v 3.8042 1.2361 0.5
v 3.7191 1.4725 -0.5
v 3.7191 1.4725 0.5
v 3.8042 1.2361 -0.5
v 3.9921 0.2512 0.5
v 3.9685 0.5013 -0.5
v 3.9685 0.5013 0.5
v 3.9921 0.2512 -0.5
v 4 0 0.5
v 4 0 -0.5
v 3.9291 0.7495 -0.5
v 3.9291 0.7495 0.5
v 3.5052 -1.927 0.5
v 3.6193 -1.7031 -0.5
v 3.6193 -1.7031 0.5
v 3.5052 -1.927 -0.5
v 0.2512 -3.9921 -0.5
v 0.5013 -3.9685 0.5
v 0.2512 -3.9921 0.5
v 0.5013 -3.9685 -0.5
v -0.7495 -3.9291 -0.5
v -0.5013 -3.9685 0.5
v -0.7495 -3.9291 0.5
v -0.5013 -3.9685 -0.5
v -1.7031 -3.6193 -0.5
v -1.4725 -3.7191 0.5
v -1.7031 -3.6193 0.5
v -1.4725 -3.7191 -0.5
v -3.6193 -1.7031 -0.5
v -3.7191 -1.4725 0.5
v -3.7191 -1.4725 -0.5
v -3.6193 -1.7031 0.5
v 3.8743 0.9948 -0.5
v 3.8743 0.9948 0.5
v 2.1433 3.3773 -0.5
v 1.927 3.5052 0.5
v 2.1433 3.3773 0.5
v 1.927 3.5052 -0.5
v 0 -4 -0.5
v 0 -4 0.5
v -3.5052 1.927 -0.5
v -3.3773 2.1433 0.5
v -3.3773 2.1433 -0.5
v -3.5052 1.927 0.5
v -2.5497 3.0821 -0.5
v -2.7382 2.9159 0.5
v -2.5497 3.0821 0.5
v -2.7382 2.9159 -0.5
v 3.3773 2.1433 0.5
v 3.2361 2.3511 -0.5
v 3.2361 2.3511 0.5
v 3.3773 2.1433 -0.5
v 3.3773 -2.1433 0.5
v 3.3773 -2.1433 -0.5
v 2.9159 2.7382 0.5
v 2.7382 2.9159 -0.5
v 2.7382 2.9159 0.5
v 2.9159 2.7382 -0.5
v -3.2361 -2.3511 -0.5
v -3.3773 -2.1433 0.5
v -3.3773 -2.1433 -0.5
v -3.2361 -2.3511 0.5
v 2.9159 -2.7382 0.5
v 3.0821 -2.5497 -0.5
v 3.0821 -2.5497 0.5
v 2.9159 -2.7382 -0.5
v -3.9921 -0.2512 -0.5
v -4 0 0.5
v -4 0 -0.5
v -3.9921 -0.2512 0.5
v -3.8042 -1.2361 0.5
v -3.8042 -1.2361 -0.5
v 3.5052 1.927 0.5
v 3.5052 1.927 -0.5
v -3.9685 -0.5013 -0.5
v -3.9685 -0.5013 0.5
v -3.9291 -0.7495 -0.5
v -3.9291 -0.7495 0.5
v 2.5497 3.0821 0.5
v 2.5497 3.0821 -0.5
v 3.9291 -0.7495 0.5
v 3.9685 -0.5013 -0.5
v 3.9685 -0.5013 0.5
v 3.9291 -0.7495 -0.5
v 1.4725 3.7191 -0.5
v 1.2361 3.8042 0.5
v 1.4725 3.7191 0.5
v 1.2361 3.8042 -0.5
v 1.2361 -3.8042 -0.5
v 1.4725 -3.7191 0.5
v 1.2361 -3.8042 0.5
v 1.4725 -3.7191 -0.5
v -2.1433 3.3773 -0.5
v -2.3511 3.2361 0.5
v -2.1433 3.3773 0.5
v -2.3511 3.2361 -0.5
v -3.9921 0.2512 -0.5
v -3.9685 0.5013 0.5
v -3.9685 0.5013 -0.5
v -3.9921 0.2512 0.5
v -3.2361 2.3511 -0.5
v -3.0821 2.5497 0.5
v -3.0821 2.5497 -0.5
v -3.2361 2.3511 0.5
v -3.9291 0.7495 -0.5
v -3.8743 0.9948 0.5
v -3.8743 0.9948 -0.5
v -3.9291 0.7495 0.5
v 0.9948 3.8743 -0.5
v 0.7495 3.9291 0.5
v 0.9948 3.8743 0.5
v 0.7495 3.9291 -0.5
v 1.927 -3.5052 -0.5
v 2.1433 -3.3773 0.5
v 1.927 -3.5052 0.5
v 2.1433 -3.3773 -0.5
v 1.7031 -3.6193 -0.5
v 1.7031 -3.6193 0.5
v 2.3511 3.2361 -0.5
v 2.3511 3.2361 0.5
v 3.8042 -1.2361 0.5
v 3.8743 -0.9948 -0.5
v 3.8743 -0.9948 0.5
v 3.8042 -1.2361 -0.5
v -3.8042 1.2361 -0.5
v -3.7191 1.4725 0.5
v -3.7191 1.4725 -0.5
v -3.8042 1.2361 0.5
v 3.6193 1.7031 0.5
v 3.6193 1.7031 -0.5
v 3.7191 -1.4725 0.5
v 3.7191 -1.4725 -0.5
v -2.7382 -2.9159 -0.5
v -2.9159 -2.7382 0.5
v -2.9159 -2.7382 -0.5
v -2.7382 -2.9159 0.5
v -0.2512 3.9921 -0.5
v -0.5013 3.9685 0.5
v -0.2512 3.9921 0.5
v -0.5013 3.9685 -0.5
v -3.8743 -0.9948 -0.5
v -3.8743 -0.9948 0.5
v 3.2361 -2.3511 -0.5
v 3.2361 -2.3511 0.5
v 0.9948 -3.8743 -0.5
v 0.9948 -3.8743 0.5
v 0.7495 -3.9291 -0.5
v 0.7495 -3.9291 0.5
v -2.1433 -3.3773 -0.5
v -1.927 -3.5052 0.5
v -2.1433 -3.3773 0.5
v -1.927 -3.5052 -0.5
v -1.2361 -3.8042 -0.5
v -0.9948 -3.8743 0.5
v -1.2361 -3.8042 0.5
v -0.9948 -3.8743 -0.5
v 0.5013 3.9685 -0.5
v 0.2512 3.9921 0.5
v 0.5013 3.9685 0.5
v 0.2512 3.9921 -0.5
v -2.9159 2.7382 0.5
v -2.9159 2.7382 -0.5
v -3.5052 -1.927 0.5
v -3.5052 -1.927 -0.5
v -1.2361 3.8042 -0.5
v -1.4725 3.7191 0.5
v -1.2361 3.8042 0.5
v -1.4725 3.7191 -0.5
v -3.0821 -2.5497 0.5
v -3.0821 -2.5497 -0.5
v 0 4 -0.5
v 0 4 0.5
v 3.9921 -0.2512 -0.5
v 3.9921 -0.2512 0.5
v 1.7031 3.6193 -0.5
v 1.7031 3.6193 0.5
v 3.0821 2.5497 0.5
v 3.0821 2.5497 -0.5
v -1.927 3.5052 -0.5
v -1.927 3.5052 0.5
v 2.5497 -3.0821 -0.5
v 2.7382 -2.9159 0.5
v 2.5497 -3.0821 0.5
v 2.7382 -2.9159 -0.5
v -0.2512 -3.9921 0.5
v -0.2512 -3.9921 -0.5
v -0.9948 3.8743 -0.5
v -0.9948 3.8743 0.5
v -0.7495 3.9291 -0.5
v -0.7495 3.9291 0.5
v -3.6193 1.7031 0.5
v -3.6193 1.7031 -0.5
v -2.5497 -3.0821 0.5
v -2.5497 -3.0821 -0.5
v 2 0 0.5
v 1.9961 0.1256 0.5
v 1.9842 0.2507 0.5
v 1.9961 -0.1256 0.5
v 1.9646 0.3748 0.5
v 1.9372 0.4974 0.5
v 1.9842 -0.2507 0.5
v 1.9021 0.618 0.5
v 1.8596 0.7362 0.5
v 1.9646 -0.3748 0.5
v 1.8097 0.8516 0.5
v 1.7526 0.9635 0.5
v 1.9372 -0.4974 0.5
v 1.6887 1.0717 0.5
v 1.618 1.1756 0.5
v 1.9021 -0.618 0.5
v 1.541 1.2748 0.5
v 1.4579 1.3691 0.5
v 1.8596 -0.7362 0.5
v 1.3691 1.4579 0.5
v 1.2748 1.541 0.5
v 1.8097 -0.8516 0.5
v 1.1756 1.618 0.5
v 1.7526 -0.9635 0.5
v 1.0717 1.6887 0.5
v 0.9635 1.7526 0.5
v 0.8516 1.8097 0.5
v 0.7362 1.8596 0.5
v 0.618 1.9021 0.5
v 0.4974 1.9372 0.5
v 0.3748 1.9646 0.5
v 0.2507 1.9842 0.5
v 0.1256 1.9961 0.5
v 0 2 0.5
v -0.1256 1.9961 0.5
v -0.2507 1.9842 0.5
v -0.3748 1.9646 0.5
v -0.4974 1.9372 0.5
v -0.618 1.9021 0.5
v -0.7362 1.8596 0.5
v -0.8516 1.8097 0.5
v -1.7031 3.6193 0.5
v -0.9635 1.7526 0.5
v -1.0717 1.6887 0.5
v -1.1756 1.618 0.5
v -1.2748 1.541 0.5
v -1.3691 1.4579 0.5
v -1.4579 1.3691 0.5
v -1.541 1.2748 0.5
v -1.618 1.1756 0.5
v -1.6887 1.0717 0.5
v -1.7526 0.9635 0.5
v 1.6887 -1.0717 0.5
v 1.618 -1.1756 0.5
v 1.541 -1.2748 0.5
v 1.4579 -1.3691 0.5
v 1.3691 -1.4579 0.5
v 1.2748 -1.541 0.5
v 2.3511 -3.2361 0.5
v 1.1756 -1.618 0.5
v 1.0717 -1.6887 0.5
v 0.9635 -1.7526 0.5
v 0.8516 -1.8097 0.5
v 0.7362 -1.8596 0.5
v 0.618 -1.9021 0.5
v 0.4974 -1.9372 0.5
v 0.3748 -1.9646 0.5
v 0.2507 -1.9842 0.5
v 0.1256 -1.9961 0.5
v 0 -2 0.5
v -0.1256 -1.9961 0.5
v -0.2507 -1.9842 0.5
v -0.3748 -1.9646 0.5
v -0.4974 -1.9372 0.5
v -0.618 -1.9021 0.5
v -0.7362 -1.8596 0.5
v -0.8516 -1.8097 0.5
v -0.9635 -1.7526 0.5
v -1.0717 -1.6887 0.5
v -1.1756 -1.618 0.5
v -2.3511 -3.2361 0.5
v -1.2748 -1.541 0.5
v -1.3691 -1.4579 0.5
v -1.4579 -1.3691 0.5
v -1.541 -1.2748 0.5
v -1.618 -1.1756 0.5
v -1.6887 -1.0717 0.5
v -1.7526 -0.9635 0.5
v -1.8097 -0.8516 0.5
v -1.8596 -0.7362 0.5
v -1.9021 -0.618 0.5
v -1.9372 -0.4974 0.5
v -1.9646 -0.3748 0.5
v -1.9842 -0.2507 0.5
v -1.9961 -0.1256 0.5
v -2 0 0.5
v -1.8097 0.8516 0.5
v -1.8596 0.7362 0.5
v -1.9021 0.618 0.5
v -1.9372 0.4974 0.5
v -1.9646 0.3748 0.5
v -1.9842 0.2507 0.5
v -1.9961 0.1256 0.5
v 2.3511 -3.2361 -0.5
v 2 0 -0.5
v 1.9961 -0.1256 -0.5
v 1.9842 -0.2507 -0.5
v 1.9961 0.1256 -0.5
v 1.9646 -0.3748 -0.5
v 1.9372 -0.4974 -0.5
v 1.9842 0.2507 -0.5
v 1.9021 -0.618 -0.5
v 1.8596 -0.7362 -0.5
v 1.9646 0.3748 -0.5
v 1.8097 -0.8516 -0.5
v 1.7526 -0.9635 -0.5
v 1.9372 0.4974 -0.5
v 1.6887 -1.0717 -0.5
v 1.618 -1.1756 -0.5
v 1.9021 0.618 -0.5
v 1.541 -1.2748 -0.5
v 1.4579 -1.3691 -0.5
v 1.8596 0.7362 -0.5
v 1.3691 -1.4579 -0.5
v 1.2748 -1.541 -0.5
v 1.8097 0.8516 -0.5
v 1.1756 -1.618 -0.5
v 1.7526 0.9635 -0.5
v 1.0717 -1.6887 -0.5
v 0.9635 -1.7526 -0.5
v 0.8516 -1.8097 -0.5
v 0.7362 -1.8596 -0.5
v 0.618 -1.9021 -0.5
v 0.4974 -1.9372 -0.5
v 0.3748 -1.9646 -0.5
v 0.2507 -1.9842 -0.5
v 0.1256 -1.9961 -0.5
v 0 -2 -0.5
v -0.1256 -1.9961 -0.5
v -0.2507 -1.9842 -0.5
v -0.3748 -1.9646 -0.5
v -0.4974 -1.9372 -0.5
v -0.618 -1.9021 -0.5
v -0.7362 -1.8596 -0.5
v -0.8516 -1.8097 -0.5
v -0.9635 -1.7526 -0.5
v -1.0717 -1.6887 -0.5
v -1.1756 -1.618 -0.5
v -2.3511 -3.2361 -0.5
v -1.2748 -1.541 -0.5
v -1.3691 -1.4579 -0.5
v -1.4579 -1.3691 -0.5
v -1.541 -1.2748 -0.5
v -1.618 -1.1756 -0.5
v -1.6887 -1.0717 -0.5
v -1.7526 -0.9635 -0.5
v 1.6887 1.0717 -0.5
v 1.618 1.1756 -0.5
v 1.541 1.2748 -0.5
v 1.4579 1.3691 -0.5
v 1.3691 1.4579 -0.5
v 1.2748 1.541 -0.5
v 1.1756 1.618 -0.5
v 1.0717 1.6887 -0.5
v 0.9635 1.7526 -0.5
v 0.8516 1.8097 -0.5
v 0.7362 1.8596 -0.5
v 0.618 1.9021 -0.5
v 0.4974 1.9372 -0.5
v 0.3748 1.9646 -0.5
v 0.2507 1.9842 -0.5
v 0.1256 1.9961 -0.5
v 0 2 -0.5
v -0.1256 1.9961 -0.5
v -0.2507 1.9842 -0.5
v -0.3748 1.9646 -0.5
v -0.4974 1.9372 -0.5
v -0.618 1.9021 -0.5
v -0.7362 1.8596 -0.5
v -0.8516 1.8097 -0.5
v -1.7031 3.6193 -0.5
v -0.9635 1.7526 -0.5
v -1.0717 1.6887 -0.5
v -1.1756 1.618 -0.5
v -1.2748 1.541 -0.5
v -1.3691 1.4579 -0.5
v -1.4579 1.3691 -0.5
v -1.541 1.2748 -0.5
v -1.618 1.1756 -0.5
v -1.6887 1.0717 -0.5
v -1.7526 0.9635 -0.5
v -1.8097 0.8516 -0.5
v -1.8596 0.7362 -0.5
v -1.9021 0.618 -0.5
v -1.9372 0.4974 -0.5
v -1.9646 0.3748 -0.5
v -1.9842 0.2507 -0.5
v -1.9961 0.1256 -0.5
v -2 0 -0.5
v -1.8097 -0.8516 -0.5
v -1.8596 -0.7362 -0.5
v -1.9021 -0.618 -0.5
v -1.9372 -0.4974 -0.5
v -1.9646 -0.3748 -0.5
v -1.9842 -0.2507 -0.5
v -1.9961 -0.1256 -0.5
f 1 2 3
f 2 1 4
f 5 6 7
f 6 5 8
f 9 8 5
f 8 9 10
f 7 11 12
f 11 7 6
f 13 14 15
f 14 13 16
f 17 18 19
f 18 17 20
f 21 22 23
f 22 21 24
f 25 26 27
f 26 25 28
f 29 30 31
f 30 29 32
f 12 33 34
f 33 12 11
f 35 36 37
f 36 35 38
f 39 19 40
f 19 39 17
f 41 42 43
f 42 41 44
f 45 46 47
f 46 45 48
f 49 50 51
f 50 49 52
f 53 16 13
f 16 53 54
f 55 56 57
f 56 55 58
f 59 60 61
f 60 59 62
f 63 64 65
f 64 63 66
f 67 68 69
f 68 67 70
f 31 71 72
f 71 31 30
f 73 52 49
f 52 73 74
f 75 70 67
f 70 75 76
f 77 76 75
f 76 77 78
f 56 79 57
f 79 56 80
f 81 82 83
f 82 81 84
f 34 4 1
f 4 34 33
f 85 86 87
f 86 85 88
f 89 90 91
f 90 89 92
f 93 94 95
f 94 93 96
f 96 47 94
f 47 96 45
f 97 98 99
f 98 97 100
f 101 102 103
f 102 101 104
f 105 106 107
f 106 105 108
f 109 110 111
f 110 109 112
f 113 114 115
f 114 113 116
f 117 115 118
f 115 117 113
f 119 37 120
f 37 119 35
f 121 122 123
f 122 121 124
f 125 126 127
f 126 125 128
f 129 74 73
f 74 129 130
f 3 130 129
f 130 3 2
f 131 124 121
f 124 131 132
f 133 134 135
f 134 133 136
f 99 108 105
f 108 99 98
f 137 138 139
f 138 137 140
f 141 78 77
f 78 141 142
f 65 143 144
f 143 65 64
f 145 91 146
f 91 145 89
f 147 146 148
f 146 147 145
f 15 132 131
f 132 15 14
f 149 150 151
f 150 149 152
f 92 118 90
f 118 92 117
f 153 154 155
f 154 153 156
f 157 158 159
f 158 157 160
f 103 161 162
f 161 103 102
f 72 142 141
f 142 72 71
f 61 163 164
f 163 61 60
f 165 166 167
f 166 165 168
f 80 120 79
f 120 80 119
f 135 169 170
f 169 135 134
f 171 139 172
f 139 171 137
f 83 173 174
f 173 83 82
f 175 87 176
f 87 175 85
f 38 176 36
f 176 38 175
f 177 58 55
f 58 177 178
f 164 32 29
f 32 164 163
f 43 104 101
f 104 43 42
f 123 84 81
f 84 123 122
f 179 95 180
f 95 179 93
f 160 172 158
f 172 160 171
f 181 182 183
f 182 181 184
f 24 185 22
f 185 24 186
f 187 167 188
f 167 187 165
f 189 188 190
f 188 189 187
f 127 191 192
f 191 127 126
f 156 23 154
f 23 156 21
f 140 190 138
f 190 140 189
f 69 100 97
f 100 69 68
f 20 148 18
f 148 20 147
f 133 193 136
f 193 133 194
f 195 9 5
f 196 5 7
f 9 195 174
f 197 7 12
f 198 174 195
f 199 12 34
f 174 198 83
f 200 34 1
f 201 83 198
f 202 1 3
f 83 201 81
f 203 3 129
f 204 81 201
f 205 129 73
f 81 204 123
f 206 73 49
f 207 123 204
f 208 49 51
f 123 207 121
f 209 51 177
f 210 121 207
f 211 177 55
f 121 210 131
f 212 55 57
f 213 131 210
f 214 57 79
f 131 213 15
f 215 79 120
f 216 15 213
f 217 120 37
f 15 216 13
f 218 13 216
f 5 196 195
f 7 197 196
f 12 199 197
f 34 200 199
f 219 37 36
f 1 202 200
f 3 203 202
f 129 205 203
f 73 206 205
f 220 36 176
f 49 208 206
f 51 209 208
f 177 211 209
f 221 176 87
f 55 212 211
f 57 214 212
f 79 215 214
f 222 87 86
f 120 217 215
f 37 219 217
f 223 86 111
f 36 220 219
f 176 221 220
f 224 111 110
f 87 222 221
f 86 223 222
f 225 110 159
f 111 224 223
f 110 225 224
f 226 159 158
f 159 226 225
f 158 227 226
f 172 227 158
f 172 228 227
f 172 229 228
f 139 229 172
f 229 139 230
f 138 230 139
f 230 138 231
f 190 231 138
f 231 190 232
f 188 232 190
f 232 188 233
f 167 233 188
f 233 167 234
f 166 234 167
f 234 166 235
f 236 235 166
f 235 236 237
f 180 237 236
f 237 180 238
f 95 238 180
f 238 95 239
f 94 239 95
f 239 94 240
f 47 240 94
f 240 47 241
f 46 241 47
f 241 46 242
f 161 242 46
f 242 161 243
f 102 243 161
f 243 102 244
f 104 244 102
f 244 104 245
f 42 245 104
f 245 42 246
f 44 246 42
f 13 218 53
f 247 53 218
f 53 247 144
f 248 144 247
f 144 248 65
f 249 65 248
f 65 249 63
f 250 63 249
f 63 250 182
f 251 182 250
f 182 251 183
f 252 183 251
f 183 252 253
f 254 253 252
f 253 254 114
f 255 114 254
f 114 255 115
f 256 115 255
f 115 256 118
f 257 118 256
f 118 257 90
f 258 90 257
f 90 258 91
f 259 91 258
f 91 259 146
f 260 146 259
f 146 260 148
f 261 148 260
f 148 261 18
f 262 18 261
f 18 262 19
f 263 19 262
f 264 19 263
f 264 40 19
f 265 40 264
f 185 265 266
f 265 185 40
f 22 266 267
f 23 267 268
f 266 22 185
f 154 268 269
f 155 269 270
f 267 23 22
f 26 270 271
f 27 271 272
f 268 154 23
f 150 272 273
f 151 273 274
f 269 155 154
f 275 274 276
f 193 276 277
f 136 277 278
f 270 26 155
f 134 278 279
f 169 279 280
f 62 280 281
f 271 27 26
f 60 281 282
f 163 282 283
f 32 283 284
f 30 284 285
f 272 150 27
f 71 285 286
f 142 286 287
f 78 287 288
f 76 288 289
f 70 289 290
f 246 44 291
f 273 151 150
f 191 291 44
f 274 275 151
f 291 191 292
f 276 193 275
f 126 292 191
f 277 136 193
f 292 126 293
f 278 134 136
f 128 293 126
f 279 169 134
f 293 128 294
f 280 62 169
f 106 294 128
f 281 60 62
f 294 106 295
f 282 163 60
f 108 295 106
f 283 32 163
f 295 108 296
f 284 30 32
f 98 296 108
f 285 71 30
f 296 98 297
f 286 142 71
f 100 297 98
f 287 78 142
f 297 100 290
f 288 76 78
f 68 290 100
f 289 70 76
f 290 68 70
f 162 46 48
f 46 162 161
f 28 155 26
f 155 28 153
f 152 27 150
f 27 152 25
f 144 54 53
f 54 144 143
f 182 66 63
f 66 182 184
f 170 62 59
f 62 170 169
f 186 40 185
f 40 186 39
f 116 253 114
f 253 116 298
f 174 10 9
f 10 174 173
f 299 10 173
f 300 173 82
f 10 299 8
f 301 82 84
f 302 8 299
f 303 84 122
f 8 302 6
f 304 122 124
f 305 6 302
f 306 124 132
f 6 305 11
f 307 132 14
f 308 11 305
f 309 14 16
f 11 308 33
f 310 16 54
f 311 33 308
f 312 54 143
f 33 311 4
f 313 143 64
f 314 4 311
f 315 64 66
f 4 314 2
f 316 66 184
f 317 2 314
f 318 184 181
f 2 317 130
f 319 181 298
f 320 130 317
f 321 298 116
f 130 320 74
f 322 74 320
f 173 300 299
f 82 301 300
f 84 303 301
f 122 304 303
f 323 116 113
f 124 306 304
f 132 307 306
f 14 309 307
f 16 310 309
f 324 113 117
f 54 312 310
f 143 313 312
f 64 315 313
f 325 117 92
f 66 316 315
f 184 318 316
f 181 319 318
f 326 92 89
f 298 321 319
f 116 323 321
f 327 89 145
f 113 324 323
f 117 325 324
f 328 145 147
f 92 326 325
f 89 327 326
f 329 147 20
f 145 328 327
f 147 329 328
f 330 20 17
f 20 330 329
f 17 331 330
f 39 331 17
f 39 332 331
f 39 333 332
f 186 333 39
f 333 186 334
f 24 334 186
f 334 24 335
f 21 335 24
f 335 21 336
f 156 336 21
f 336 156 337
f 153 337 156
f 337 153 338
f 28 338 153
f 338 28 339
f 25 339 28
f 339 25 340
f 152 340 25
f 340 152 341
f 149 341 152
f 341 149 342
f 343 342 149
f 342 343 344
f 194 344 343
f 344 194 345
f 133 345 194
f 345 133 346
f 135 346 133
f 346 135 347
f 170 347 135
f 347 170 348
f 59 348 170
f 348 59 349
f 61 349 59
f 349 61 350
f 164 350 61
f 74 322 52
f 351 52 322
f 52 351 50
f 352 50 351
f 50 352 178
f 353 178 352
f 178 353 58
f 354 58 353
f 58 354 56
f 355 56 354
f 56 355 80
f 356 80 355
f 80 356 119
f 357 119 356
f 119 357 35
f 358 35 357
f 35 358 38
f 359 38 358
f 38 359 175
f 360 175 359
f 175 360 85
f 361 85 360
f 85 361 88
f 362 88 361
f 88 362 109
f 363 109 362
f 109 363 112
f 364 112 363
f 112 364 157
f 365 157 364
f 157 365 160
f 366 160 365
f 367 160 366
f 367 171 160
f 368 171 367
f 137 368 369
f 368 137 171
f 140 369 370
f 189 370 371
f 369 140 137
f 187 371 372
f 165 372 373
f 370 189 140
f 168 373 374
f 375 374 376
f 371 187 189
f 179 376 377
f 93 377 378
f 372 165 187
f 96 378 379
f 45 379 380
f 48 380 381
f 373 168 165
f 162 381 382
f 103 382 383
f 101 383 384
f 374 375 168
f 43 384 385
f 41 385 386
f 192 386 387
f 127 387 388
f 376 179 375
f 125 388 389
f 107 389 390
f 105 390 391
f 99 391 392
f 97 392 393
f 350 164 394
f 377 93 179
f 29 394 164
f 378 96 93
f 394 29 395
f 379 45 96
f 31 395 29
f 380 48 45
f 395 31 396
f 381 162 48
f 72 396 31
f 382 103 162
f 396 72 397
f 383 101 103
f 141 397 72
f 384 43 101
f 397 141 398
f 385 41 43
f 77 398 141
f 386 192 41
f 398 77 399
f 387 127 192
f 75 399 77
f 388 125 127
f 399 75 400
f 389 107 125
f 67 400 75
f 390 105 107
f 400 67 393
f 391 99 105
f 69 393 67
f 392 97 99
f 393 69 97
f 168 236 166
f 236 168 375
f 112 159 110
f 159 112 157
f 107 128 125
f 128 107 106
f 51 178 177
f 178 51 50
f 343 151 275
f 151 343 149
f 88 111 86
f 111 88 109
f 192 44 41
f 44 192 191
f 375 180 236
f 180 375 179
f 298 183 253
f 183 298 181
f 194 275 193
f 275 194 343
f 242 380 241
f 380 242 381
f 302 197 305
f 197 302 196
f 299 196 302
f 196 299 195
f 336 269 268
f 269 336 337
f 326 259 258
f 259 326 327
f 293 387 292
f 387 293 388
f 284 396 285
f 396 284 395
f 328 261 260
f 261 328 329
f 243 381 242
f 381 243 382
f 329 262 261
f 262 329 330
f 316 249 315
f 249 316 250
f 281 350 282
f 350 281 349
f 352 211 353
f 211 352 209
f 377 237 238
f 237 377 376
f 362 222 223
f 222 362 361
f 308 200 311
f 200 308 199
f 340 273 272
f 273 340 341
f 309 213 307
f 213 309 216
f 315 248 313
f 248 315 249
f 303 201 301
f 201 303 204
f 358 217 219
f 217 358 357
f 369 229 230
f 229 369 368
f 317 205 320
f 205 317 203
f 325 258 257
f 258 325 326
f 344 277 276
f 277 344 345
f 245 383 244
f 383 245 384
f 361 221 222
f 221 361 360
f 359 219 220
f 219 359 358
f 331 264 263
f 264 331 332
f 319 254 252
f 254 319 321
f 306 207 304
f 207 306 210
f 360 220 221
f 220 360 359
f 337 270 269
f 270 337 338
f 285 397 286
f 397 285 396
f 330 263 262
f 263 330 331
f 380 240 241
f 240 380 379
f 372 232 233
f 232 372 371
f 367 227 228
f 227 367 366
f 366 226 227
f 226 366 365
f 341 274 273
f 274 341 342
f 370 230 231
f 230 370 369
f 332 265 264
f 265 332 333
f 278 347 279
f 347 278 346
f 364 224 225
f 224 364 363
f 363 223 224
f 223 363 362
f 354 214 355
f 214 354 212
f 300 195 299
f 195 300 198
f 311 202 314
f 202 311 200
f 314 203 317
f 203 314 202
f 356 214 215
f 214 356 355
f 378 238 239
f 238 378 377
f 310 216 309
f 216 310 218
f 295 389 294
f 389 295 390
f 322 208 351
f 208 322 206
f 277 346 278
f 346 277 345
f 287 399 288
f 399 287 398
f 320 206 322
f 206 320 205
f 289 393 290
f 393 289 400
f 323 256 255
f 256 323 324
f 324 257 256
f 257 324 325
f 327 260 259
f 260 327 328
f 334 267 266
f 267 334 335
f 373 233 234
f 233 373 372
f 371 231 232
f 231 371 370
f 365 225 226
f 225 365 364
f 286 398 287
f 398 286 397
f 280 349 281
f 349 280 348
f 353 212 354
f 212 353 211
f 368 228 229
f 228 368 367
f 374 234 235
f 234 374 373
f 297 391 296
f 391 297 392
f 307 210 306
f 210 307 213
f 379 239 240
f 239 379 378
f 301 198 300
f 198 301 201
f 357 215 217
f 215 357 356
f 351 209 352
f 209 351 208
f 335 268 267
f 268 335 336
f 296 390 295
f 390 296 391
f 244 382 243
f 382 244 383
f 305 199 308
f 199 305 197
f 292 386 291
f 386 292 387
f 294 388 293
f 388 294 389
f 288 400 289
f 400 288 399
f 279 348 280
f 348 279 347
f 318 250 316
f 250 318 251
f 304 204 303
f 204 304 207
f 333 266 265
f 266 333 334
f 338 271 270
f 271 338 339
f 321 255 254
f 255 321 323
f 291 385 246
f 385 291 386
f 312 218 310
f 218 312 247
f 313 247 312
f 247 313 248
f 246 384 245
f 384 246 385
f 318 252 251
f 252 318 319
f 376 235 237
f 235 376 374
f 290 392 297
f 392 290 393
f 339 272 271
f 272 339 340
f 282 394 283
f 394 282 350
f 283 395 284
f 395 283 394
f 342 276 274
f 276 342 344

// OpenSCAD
// [FL_INDEX: keywords="openscad, 3d_parametric, Customizable_Gasket, csg_solid" | COT="Parametric OpenSCAD design from 3DCodeverse"]
// Title: Customizable Gasket

//Customizable Gasket
// This is a simple open-source parametric gasket

//CUSTOMIZER VARIABLES
//Defines the height of the gasket
gasket_thickness=1; //[1:10] 

//Defines the gasket outer diameter
gasket_outer_diameter=2; //[2:100]

//Defines the gasket inner diameter
gasket_inner_diameter=1; //Numeric value smaller than Gasket Outer Diameter

//CUSTOMIZER VARIABLES END

module gasket()
{
	difference()
	{
	cylinder(h=gasket_thickness, r=gasket_outer_diameter*2, center=true, $fn=100);
	cylinder(h=gasket_thickness, r=gasket_inner_diameter*2, center=true, $fn=100);
	}
}

gasket();
